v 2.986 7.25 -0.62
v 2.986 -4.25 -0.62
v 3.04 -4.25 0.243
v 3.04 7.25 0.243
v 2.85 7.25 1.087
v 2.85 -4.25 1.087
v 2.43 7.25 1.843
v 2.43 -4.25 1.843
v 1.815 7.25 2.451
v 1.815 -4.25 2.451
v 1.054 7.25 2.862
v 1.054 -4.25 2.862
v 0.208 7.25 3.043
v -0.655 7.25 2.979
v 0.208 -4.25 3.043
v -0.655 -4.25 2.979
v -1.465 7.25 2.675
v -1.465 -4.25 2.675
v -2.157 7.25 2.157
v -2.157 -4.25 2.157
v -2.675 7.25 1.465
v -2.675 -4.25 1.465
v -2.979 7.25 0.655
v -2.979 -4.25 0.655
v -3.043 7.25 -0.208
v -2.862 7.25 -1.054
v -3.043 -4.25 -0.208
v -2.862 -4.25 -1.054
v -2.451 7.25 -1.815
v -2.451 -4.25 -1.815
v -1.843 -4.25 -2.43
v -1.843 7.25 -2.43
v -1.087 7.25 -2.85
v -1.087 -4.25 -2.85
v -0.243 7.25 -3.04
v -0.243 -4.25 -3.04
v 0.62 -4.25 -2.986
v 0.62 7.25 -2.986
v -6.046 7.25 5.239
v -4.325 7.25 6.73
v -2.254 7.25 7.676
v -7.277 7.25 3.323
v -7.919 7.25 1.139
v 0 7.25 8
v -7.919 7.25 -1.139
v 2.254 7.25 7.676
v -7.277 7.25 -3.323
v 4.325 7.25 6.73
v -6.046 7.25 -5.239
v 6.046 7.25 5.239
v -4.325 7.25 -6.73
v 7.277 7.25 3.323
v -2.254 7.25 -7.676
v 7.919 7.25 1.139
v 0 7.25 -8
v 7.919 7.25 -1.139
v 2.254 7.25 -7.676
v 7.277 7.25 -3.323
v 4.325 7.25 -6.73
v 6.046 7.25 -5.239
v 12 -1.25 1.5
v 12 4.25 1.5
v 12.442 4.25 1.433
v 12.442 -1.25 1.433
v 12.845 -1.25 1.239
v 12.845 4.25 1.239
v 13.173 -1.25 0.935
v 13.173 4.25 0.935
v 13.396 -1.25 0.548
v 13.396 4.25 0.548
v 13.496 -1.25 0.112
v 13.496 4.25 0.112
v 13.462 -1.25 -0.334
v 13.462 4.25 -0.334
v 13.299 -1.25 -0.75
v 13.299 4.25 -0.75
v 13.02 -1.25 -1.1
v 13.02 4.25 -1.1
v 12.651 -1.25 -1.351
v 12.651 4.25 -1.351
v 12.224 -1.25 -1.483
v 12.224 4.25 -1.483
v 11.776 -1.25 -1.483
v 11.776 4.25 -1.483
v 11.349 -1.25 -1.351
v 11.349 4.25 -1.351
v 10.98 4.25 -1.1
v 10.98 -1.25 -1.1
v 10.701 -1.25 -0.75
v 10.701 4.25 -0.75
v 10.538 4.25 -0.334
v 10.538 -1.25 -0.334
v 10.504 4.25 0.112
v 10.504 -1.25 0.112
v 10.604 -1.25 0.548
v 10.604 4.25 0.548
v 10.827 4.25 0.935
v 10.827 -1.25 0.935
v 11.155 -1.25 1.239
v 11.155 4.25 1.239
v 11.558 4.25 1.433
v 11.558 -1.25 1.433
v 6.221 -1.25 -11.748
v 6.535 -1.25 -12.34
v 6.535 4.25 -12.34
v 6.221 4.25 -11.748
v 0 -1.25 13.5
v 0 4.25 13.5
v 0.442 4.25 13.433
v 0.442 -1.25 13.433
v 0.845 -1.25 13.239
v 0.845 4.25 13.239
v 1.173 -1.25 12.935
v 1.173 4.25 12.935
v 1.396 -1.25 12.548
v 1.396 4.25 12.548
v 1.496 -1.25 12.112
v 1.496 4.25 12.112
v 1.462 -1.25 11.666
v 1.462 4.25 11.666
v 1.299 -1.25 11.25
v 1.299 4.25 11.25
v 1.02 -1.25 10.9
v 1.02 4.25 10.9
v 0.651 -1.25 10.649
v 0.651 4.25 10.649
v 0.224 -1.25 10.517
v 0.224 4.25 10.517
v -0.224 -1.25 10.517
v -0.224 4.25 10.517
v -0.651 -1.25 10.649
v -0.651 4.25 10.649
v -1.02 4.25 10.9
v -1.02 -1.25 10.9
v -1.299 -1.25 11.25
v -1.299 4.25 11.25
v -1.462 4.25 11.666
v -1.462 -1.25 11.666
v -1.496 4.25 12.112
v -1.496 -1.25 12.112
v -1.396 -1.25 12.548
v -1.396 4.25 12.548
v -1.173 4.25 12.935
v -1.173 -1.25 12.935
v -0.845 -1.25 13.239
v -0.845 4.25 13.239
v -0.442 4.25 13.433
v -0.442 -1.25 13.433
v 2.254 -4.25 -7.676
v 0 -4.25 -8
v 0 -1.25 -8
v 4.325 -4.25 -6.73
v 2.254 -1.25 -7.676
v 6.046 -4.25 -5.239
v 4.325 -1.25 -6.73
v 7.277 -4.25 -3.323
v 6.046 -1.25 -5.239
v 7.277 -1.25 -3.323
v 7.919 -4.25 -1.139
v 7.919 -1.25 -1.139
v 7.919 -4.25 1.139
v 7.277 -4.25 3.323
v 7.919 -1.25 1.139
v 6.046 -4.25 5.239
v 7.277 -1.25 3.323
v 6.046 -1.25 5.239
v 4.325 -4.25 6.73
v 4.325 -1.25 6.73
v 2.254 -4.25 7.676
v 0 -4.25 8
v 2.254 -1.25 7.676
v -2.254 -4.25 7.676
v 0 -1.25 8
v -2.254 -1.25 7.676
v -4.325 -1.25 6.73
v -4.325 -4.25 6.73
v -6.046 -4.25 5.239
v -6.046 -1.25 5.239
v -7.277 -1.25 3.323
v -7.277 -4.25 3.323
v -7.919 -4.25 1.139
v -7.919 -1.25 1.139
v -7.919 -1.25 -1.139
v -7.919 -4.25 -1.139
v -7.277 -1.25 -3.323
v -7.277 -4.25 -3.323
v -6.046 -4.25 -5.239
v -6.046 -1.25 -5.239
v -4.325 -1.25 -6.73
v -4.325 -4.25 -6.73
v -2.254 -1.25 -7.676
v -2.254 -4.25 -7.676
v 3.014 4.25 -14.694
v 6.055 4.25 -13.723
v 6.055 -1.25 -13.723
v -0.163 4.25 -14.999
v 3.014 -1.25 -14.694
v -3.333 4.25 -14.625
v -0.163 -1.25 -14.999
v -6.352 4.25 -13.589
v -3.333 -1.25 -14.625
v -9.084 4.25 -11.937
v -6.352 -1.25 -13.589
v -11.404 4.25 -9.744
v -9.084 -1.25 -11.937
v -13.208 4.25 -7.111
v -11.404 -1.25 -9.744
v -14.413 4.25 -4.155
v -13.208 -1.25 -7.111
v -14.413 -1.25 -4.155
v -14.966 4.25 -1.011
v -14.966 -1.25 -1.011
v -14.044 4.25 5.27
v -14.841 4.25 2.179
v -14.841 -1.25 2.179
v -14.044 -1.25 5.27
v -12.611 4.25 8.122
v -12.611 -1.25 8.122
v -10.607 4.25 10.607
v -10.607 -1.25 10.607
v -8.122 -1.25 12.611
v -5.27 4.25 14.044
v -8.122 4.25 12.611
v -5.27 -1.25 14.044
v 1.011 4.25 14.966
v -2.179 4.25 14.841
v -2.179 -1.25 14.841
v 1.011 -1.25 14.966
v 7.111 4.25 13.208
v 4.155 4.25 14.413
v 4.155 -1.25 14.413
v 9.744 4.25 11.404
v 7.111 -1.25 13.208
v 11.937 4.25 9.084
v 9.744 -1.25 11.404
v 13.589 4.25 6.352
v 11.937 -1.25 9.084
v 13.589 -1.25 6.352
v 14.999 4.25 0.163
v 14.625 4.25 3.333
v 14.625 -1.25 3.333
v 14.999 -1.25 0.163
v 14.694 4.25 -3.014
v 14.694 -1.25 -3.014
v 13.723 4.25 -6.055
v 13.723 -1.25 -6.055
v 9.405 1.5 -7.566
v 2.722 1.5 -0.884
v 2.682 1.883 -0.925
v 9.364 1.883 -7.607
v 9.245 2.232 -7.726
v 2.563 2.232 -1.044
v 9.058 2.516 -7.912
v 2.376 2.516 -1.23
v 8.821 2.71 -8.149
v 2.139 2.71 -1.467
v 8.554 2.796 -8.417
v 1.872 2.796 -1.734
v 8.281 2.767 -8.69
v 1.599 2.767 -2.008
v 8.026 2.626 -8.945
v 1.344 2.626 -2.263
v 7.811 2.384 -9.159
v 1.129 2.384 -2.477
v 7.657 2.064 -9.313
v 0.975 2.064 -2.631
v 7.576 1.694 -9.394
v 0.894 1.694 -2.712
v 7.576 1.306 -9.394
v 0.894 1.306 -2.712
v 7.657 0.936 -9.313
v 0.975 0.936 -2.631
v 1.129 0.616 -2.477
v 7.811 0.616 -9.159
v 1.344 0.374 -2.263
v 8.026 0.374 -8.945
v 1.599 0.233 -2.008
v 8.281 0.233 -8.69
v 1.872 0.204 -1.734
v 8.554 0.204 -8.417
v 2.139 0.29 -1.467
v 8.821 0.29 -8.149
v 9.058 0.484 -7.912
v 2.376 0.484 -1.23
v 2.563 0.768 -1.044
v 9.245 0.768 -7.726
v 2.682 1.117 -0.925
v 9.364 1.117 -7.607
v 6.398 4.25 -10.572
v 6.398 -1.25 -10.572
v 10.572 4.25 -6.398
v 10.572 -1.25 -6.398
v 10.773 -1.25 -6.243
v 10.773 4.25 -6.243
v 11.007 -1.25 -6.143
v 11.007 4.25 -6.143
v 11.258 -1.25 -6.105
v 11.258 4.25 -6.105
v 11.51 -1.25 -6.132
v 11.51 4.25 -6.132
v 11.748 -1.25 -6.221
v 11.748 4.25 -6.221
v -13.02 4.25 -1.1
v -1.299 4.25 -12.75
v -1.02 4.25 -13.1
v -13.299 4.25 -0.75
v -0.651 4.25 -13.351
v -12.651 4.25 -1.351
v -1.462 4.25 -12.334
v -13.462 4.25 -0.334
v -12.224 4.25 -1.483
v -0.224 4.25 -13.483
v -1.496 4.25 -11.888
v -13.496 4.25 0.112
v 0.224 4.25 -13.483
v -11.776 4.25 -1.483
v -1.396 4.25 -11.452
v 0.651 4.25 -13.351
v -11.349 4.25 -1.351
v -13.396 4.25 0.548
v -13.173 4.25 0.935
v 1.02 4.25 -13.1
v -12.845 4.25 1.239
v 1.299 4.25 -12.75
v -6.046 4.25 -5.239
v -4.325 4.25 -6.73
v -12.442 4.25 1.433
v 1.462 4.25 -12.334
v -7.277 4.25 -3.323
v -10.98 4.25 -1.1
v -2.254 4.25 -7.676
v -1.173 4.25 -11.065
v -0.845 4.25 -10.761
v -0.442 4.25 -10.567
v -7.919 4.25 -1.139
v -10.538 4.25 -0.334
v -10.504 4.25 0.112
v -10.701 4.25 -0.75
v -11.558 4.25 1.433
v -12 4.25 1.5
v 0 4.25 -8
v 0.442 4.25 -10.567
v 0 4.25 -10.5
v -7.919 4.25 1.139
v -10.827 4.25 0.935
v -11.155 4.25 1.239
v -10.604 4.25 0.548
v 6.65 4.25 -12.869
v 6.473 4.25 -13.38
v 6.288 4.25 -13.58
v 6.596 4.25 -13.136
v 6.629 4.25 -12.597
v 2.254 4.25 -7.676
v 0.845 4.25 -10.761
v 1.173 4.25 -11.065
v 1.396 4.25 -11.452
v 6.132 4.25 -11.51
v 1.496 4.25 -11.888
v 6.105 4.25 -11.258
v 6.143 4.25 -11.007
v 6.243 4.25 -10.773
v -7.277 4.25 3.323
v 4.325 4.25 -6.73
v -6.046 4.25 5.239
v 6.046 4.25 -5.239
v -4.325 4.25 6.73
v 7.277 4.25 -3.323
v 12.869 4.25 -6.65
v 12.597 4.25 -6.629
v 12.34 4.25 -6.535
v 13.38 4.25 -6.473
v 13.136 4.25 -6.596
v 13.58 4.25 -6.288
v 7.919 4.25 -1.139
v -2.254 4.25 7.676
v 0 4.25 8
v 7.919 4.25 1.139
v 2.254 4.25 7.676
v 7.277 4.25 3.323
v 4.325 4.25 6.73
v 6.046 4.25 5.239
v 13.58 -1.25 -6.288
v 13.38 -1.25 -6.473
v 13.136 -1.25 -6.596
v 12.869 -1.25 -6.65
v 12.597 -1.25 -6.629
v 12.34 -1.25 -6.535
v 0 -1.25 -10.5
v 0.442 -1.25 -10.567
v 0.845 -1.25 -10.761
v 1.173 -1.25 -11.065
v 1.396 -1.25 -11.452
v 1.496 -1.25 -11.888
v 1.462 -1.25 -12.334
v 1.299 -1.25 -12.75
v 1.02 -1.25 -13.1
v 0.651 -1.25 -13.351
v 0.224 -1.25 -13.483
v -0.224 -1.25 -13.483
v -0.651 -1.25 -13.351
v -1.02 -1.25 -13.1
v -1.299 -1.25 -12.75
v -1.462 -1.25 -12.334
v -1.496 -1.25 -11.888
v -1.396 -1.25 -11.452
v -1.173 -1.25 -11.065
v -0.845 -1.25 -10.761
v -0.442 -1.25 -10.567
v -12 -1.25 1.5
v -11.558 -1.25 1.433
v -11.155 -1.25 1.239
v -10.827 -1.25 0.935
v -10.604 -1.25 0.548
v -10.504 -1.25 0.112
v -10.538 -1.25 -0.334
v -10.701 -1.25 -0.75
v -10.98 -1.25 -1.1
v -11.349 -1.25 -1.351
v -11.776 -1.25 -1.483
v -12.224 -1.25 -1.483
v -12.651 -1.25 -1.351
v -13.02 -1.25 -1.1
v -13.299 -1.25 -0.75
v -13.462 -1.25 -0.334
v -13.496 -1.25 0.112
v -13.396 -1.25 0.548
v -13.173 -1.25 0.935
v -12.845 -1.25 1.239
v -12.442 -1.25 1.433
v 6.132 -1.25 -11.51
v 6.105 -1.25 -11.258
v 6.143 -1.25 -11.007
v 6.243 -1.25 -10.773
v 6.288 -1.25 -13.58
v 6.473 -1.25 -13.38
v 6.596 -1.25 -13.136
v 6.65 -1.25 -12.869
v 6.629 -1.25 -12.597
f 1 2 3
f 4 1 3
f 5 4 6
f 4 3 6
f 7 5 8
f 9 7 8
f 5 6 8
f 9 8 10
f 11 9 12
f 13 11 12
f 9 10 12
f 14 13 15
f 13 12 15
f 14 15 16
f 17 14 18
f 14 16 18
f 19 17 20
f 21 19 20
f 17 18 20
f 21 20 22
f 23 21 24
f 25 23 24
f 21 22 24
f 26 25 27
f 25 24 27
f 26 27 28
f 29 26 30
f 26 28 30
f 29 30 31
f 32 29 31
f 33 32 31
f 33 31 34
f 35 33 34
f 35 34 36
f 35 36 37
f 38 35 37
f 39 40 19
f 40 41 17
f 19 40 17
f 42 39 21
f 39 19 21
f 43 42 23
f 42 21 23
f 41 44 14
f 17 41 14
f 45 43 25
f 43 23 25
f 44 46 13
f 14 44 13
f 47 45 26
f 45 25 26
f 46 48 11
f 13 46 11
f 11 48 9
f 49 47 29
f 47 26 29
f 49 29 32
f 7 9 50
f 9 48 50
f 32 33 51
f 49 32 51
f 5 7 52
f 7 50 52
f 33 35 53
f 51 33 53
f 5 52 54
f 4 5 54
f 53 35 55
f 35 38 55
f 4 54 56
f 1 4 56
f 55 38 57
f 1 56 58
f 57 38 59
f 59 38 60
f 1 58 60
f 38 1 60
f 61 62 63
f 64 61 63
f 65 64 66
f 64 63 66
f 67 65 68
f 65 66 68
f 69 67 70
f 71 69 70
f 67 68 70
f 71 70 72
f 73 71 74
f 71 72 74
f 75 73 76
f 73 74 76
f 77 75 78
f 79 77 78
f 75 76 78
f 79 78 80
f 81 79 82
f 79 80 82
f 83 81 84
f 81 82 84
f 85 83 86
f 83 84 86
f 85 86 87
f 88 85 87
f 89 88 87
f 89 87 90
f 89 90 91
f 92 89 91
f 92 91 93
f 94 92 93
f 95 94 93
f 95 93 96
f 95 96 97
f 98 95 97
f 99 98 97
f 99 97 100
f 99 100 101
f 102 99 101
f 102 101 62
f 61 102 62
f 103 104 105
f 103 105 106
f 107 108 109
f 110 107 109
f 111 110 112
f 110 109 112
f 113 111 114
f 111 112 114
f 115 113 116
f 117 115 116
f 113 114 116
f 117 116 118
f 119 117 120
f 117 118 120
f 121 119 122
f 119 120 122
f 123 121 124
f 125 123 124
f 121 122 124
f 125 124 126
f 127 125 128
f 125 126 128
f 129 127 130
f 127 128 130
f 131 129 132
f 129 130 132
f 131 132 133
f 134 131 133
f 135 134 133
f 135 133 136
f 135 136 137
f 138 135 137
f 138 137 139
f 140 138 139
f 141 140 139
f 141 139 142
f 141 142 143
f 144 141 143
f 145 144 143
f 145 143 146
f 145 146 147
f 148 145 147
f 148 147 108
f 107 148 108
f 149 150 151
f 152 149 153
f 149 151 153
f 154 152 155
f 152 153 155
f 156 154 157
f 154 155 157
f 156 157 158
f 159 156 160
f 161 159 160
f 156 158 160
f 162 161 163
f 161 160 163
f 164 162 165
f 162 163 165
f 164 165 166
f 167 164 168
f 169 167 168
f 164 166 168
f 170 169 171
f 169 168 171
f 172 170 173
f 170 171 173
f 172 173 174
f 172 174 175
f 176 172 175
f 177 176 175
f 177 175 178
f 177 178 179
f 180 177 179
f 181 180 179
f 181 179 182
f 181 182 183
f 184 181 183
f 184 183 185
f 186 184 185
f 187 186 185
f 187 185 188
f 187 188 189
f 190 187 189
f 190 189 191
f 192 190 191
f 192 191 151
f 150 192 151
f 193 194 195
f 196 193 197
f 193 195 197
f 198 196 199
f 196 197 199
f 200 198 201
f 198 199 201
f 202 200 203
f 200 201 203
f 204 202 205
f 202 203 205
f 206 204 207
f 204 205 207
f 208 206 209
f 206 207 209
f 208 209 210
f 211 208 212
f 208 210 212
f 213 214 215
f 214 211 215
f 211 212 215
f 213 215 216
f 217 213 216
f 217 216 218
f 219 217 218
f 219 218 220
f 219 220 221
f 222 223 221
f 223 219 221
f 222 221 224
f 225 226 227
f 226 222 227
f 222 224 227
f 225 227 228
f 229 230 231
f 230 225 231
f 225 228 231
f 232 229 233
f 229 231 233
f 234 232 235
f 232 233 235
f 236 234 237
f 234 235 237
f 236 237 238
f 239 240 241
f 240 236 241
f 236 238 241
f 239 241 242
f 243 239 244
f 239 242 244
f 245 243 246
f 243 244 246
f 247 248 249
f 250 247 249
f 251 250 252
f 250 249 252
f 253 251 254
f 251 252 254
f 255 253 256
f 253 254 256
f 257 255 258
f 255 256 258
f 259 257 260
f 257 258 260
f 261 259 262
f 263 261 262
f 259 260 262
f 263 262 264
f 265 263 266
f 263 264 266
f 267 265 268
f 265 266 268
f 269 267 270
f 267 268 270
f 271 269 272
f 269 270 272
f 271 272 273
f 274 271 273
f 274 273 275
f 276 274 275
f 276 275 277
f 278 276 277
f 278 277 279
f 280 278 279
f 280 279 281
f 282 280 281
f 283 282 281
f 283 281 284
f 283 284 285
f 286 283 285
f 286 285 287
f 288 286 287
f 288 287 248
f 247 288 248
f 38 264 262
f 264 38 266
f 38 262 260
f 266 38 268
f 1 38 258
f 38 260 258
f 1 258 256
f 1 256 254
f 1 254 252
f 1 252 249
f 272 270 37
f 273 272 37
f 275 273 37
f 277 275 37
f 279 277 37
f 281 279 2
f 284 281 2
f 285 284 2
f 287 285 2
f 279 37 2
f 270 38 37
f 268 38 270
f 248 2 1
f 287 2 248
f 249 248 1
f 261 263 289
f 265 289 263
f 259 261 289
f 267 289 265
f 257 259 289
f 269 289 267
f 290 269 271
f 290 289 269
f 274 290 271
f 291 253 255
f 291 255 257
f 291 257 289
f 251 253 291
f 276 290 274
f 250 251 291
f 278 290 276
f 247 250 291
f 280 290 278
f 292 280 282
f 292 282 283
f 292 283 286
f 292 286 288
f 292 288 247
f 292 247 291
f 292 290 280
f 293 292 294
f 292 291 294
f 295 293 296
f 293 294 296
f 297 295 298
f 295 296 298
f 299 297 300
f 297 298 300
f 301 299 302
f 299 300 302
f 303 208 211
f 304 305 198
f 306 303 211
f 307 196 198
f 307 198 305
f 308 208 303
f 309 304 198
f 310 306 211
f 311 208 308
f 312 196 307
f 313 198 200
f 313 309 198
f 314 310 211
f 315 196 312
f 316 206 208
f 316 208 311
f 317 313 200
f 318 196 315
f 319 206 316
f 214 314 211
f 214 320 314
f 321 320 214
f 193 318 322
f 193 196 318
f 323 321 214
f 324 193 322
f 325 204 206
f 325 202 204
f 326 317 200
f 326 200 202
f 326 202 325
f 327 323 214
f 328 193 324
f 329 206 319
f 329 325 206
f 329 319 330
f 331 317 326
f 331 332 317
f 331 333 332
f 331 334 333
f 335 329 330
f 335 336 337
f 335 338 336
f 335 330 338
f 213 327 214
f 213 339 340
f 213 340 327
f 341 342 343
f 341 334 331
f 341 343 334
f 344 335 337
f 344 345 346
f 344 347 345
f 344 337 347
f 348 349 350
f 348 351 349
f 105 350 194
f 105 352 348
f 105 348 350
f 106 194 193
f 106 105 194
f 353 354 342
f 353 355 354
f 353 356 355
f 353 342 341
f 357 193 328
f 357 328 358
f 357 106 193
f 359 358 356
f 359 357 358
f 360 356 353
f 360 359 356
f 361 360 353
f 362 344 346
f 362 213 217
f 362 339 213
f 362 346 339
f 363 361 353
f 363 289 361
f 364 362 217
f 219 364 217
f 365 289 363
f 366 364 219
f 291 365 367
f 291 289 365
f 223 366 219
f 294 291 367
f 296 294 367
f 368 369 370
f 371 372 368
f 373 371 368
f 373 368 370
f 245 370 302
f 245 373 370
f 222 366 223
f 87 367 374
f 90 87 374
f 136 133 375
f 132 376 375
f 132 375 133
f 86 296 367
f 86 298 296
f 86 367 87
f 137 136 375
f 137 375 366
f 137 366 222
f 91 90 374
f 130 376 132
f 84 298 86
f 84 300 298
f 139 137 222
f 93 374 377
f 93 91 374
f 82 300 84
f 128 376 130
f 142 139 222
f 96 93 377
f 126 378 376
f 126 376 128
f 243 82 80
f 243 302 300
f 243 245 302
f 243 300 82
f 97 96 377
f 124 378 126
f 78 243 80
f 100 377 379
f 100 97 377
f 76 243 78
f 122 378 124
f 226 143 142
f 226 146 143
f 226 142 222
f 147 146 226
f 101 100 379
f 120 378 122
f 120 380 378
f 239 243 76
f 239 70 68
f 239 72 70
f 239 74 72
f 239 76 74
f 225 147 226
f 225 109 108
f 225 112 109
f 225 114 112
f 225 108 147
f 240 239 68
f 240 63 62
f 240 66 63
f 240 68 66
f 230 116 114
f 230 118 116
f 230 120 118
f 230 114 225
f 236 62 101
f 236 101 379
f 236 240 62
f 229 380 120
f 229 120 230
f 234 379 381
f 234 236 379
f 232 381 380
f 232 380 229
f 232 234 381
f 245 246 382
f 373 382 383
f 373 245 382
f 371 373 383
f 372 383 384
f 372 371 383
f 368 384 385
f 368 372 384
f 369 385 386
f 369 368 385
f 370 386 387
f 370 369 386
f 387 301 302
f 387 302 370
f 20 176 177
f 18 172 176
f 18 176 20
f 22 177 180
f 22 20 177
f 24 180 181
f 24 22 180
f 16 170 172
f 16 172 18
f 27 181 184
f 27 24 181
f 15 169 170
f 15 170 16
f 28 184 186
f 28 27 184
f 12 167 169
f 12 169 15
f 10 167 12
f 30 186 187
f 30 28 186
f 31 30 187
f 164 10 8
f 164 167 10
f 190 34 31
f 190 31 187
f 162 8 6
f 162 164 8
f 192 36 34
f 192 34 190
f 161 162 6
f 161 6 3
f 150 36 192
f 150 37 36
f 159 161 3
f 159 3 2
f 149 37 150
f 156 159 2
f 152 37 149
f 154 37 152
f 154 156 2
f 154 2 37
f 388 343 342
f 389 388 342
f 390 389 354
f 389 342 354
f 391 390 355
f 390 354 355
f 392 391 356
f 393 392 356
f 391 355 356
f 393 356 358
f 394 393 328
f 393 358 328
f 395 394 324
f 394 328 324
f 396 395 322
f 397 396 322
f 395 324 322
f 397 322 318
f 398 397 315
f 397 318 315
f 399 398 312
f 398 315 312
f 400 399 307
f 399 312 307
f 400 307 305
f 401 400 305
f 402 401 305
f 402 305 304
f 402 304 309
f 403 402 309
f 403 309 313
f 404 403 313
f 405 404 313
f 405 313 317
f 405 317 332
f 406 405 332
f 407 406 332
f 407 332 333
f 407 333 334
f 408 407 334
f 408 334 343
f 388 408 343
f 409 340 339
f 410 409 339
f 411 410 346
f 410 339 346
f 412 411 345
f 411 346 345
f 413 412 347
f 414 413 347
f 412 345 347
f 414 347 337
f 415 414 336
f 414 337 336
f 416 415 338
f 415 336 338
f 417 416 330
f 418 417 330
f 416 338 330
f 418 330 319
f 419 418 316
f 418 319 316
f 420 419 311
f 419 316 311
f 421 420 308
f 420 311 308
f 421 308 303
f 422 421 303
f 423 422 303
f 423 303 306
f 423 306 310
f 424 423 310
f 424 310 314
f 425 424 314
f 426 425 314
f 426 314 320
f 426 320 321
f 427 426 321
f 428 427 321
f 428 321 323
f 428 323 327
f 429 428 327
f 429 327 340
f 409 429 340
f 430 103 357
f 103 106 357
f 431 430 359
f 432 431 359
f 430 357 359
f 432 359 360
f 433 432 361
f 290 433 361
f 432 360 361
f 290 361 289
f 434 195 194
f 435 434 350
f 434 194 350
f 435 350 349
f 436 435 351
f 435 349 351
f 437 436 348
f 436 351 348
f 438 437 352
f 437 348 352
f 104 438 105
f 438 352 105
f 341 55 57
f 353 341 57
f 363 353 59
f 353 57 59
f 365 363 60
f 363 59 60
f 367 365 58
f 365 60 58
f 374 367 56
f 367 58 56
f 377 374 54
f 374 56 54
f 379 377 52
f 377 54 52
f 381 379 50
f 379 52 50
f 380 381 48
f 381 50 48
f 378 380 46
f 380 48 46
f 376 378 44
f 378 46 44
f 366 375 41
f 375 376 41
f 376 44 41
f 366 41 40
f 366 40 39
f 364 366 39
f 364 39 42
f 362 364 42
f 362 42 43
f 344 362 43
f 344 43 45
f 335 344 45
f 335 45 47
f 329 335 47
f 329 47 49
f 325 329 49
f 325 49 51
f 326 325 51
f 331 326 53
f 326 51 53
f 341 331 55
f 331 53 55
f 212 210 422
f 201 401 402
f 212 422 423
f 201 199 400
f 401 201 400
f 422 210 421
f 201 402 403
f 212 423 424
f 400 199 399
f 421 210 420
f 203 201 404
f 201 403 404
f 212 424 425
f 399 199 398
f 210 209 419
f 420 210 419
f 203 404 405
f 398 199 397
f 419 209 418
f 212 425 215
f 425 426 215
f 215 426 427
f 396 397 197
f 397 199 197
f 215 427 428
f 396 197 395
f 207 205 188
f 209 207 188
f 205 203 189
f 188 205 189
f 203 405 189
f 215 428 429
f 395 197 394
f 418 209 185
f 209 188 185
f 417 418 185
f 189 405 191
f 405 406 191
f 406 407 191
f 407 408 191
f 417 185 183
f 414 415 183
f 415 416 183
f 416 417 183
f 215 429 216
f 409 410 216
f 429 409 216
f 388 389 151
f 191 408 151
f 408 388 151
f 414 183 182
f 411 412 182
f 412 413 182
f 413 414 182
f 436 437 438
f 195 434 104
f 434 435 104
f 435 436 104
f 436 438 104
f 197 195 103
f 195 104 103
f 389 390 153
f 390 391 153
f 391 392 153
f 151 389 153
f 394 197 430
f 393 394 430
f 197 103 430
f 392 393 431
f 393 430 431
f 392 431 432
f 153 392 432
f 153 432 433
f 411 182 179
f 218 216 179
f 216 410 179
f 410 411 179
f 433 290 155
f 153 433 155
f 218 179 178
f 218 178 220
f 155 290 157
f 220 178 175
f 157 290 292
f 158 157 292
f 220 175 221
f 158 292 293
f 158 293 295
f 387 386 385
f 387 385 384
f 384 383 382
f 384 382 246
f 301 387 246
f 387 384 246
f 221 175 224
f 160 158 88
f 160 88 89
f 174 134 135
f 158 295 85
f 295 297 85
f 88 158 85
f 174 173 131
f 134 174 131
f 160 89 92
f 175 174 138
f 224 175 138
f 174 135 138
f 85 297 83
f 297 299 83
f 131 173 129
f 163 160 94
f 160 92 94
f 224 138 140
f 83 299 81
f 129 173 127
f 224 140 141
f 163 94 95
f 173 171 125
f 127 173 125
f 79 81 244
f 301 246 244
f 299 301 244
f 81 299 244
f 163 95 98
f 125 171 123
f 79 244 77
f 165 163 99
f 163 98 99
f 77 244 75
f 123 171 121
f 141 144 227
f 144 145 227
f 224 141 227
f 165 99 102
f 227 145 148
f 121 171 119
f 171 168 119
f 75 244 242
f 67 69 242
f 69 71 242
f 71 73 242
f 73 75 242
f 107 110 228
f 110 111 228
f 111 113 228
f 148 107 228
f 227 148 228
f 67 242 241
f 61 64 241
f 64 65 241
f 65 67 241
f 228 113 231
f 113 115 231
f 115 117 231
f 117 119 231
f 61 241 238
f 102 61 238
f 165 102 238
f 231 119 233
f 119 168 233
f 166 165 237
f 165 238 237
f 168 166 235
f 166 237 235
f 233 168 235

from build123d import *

# Parameters (mm, degrees)
SKETCH_1_R               = 15
SKETCH_1_R_2             = 2
SKETCH_1_R_3             = 1.5
EXTRUDE_1_DEPTH          = 3
EXTRUDE_2_DEPTH          = 4.25
EXTRUDE_2_DEPTH_BACK     = 7.25
SKETCH_2_R               = 8
EXTRUDE_3_DEPTH          = 1.25
EXTRUDE_3_DEPTH_BACK     = 4.25
SKETCH_5_R               = 15
CUT_EXTRUDE_1_DEPTH      = 5
CUT_EXTRUDE_1_DEPTH_BACK = 16.5
SKETCH_6_R               = 1.3
CUT_EXTRUDE_2_DEPTH      = 14
SKETCH_7_R               = 1.5
CUT_EXTRUDE_4_DEPTH      = 14
CUT_EXTRUDE_START        = -14
CUT_EXTRUDE_5_DEPTH      = 14
FILLET_1_R               = 1


with BuildPart() as part:
    # 草图1 → 凸台-拉伸1 (new body)
    with BuildSketch(Plane(origin=(0, 0, 0), x_dir=(1, 0, 0), z_dir=(0, 1, 0))):
        with Locations(Location((0, 0, 0), (0, 0, 270))):
            Circle(SKETCH_1_R)
        with Locations(Location((0, 0, 0), (0, 0, 270))):
            Circle(SKETCH_1_R_2, mode=Mode.SUBTRACT)
        with Locations(Location((0, 6, 0), (0, 0, 270))):
            Circle(SKETCH_1_R_3, mode=Mode.SUBTRACT)
        with Locations(Location((6, 0, 0), (0, 0, 270))):
            Circle(SKETCH_1_R_3, mode=Mode.SUBTRACT)
        with Locations(Location((0, -6, 0), (0, 0, 270))):
            Circle(SKETCH_1_R_3, mode=Mode.SUBTRACT)
        with Locations(Location((-6, 0, 0), (0, 0, 270))):
            Circle(SKETCH_1_R_3, mode=Mode.SUBTRACT)
        with Locations(Location((0, 12, 0), (0, 0, 270))):
            Circle(SKETCH_1_R_3, mode=Mode.SUBTRACT)
        with Locations(Location((12, 0, 0), (0, 0, 270))):
            Circle(SKETCH_1_R_3, mode=Mode.SUBTRACT)
        with Locations(Location((0, -12, 0), (0, 0, 270))):
            Circle(SKETCH_1_R_3, mode=Mode.SUBTRACT)
        with Locations(Location((-12, 0, 0), (0, 0, 270))):
            Circle(SKETCH_1_R_3, mode=Mode.SUBTRACT)
    extrude(amount=EXTRUDE_1_DEPTH)

    # 草图2 → 凸台-拉伸2 (add, two sides: drawn at the far end of the back side and taken through both)
    with BuildSketch(Plane.XZ.offset(-EXTRUDE_2_DEPTH_BACK)):
        with Locations(Location((0, 0, 0), (0, 0, 270))):
            Circle(SKETCH_2_R)
    extrude(amount=EXTRUDE_2_DEPTH + EXTRUDE_2_DEPTH_BACK)

    # 草图5 → 凸台-拉伸3 (add, two sides: drawn at the far end of the back side and taken through both)
    with BuildSketch(Plane(origin=(0, 3, 0), x_dir=(1, 0, 0), z_dir=(0, 1, 0)).offset(-EXTRUDE_3_DEPTH_BACK)):
        with Locations(Location((0, 0, 0), (0, 0, 270))):
            Circle(SKETCH_5_R)
    extrude(amount=EXTRUDE_3_DEPTH + EXTRUDE_3_DEPTH_BACK)

    # 草图3 → 切除-拉伸1 (cut, two sides: drawn at the far end of the back side and taken through both)
    with BuildSketch(Plane(origin=(0, 3, 0), x_dir=(1, 0, 0), z_dir=(0, 1, 0)).offset(-CUT_EXTRUDE_1_DEPTH_BACK)):
        with BuildLine():
            Line((0.619906335, 2.986338249), (2.986338249, 0.619906335))
            ThreePointArc((2.986338249, 0.619906335), (-2.156675683, -2.156675683), (0.619906335, 2.986338249))
        make_face()
    extrude(amount=CUT_EXTRUDE_1_DEPTH + CUT_EXTRUDE_1_DEPTH_BACK, mode=Mode.SUBTRACT)

    # 草图6 → 切除-拉伸2 (cut)
    with BuildSketch(Plane(origin=(1.803122292, 0, -1.803122292), x_dir=(0.7071067811865465, 0, 0.7071067811865486), z_dir=(-0.7071067811865486, 0, 0.7071067811865465))):
        with Locations((0, 1.5)):
            Circle(SKETCH_6_R)
    extrude(amount=-CUT_EXTRUDE_2_DEPTH, mode=Mode.SUBTRACT)

    # 草图7 → 切除-拉伸4 (cut)
    with BuildSketch(Plane(origin=(0, 7.25, 0), x_dir=(1, 0, 0), z_dir=(0, 1, 0))):
        with Locations(Location((0, 12, 0), (0, 0, 270))):
            Circle(SKETCH_7_R)
        with Locations(Location((-12, 0, 0), (0, 0, 270))):
            Circle(SKETCH_7_R)
        with Locations(Location((12, 0, 0), (0, 0, 270))):
            Circle(SKETCH_7_R)
        with Locations(Location((0, -12, 0), (0, 0, 270))):
            Circle(SKETCH_7_R)
    extrude(amount=-CUT_EXTRUDE_4_DEPTH, mode=Mode.SUBTRACT)

    # 草图8 → 切除-拉伸5 (cut)
    with BuildSketch(Plane(origin=(0, 4.25, 0), x_dir=(1, 0, 0), z_dir=(0, 1, 0)).offset(CUT_EXTRUDE_START)):
        with BuildLine():
            Line((7.02021556, 13.255812819), (5.875756654, 11.094806094))
            Line((5.875756654, 11.094806094), (11.094806094, 5.875756654))
            Line((11.094806094, 5.875756654), (13.255812819, 7.02021556))
            ThreePointArc((13.255812819, 7.02021556), (10.606601718, 10.606601718), (7.02021556, 13.255812819))
        make_face()
    extrude(amount=CUT_EXTRUDE_5_DEPTH, mode=Mode.SUBTRACT)

    # 圆角1
    fillet_1_edges = [part.edges().sort_by_distance(p)[0] for p in [
        (13.255812819, 1.5, -7.02021556),
        (5.875756654, 1.5, -11.094806094),
        (7.02021556, 1.5, -13.255812819),
        (11.094806094, 1.5, -5.875756654),
    ]]
    fillet(fillet_1_edges, radius=FILLET_1_R)


solid = part.part
